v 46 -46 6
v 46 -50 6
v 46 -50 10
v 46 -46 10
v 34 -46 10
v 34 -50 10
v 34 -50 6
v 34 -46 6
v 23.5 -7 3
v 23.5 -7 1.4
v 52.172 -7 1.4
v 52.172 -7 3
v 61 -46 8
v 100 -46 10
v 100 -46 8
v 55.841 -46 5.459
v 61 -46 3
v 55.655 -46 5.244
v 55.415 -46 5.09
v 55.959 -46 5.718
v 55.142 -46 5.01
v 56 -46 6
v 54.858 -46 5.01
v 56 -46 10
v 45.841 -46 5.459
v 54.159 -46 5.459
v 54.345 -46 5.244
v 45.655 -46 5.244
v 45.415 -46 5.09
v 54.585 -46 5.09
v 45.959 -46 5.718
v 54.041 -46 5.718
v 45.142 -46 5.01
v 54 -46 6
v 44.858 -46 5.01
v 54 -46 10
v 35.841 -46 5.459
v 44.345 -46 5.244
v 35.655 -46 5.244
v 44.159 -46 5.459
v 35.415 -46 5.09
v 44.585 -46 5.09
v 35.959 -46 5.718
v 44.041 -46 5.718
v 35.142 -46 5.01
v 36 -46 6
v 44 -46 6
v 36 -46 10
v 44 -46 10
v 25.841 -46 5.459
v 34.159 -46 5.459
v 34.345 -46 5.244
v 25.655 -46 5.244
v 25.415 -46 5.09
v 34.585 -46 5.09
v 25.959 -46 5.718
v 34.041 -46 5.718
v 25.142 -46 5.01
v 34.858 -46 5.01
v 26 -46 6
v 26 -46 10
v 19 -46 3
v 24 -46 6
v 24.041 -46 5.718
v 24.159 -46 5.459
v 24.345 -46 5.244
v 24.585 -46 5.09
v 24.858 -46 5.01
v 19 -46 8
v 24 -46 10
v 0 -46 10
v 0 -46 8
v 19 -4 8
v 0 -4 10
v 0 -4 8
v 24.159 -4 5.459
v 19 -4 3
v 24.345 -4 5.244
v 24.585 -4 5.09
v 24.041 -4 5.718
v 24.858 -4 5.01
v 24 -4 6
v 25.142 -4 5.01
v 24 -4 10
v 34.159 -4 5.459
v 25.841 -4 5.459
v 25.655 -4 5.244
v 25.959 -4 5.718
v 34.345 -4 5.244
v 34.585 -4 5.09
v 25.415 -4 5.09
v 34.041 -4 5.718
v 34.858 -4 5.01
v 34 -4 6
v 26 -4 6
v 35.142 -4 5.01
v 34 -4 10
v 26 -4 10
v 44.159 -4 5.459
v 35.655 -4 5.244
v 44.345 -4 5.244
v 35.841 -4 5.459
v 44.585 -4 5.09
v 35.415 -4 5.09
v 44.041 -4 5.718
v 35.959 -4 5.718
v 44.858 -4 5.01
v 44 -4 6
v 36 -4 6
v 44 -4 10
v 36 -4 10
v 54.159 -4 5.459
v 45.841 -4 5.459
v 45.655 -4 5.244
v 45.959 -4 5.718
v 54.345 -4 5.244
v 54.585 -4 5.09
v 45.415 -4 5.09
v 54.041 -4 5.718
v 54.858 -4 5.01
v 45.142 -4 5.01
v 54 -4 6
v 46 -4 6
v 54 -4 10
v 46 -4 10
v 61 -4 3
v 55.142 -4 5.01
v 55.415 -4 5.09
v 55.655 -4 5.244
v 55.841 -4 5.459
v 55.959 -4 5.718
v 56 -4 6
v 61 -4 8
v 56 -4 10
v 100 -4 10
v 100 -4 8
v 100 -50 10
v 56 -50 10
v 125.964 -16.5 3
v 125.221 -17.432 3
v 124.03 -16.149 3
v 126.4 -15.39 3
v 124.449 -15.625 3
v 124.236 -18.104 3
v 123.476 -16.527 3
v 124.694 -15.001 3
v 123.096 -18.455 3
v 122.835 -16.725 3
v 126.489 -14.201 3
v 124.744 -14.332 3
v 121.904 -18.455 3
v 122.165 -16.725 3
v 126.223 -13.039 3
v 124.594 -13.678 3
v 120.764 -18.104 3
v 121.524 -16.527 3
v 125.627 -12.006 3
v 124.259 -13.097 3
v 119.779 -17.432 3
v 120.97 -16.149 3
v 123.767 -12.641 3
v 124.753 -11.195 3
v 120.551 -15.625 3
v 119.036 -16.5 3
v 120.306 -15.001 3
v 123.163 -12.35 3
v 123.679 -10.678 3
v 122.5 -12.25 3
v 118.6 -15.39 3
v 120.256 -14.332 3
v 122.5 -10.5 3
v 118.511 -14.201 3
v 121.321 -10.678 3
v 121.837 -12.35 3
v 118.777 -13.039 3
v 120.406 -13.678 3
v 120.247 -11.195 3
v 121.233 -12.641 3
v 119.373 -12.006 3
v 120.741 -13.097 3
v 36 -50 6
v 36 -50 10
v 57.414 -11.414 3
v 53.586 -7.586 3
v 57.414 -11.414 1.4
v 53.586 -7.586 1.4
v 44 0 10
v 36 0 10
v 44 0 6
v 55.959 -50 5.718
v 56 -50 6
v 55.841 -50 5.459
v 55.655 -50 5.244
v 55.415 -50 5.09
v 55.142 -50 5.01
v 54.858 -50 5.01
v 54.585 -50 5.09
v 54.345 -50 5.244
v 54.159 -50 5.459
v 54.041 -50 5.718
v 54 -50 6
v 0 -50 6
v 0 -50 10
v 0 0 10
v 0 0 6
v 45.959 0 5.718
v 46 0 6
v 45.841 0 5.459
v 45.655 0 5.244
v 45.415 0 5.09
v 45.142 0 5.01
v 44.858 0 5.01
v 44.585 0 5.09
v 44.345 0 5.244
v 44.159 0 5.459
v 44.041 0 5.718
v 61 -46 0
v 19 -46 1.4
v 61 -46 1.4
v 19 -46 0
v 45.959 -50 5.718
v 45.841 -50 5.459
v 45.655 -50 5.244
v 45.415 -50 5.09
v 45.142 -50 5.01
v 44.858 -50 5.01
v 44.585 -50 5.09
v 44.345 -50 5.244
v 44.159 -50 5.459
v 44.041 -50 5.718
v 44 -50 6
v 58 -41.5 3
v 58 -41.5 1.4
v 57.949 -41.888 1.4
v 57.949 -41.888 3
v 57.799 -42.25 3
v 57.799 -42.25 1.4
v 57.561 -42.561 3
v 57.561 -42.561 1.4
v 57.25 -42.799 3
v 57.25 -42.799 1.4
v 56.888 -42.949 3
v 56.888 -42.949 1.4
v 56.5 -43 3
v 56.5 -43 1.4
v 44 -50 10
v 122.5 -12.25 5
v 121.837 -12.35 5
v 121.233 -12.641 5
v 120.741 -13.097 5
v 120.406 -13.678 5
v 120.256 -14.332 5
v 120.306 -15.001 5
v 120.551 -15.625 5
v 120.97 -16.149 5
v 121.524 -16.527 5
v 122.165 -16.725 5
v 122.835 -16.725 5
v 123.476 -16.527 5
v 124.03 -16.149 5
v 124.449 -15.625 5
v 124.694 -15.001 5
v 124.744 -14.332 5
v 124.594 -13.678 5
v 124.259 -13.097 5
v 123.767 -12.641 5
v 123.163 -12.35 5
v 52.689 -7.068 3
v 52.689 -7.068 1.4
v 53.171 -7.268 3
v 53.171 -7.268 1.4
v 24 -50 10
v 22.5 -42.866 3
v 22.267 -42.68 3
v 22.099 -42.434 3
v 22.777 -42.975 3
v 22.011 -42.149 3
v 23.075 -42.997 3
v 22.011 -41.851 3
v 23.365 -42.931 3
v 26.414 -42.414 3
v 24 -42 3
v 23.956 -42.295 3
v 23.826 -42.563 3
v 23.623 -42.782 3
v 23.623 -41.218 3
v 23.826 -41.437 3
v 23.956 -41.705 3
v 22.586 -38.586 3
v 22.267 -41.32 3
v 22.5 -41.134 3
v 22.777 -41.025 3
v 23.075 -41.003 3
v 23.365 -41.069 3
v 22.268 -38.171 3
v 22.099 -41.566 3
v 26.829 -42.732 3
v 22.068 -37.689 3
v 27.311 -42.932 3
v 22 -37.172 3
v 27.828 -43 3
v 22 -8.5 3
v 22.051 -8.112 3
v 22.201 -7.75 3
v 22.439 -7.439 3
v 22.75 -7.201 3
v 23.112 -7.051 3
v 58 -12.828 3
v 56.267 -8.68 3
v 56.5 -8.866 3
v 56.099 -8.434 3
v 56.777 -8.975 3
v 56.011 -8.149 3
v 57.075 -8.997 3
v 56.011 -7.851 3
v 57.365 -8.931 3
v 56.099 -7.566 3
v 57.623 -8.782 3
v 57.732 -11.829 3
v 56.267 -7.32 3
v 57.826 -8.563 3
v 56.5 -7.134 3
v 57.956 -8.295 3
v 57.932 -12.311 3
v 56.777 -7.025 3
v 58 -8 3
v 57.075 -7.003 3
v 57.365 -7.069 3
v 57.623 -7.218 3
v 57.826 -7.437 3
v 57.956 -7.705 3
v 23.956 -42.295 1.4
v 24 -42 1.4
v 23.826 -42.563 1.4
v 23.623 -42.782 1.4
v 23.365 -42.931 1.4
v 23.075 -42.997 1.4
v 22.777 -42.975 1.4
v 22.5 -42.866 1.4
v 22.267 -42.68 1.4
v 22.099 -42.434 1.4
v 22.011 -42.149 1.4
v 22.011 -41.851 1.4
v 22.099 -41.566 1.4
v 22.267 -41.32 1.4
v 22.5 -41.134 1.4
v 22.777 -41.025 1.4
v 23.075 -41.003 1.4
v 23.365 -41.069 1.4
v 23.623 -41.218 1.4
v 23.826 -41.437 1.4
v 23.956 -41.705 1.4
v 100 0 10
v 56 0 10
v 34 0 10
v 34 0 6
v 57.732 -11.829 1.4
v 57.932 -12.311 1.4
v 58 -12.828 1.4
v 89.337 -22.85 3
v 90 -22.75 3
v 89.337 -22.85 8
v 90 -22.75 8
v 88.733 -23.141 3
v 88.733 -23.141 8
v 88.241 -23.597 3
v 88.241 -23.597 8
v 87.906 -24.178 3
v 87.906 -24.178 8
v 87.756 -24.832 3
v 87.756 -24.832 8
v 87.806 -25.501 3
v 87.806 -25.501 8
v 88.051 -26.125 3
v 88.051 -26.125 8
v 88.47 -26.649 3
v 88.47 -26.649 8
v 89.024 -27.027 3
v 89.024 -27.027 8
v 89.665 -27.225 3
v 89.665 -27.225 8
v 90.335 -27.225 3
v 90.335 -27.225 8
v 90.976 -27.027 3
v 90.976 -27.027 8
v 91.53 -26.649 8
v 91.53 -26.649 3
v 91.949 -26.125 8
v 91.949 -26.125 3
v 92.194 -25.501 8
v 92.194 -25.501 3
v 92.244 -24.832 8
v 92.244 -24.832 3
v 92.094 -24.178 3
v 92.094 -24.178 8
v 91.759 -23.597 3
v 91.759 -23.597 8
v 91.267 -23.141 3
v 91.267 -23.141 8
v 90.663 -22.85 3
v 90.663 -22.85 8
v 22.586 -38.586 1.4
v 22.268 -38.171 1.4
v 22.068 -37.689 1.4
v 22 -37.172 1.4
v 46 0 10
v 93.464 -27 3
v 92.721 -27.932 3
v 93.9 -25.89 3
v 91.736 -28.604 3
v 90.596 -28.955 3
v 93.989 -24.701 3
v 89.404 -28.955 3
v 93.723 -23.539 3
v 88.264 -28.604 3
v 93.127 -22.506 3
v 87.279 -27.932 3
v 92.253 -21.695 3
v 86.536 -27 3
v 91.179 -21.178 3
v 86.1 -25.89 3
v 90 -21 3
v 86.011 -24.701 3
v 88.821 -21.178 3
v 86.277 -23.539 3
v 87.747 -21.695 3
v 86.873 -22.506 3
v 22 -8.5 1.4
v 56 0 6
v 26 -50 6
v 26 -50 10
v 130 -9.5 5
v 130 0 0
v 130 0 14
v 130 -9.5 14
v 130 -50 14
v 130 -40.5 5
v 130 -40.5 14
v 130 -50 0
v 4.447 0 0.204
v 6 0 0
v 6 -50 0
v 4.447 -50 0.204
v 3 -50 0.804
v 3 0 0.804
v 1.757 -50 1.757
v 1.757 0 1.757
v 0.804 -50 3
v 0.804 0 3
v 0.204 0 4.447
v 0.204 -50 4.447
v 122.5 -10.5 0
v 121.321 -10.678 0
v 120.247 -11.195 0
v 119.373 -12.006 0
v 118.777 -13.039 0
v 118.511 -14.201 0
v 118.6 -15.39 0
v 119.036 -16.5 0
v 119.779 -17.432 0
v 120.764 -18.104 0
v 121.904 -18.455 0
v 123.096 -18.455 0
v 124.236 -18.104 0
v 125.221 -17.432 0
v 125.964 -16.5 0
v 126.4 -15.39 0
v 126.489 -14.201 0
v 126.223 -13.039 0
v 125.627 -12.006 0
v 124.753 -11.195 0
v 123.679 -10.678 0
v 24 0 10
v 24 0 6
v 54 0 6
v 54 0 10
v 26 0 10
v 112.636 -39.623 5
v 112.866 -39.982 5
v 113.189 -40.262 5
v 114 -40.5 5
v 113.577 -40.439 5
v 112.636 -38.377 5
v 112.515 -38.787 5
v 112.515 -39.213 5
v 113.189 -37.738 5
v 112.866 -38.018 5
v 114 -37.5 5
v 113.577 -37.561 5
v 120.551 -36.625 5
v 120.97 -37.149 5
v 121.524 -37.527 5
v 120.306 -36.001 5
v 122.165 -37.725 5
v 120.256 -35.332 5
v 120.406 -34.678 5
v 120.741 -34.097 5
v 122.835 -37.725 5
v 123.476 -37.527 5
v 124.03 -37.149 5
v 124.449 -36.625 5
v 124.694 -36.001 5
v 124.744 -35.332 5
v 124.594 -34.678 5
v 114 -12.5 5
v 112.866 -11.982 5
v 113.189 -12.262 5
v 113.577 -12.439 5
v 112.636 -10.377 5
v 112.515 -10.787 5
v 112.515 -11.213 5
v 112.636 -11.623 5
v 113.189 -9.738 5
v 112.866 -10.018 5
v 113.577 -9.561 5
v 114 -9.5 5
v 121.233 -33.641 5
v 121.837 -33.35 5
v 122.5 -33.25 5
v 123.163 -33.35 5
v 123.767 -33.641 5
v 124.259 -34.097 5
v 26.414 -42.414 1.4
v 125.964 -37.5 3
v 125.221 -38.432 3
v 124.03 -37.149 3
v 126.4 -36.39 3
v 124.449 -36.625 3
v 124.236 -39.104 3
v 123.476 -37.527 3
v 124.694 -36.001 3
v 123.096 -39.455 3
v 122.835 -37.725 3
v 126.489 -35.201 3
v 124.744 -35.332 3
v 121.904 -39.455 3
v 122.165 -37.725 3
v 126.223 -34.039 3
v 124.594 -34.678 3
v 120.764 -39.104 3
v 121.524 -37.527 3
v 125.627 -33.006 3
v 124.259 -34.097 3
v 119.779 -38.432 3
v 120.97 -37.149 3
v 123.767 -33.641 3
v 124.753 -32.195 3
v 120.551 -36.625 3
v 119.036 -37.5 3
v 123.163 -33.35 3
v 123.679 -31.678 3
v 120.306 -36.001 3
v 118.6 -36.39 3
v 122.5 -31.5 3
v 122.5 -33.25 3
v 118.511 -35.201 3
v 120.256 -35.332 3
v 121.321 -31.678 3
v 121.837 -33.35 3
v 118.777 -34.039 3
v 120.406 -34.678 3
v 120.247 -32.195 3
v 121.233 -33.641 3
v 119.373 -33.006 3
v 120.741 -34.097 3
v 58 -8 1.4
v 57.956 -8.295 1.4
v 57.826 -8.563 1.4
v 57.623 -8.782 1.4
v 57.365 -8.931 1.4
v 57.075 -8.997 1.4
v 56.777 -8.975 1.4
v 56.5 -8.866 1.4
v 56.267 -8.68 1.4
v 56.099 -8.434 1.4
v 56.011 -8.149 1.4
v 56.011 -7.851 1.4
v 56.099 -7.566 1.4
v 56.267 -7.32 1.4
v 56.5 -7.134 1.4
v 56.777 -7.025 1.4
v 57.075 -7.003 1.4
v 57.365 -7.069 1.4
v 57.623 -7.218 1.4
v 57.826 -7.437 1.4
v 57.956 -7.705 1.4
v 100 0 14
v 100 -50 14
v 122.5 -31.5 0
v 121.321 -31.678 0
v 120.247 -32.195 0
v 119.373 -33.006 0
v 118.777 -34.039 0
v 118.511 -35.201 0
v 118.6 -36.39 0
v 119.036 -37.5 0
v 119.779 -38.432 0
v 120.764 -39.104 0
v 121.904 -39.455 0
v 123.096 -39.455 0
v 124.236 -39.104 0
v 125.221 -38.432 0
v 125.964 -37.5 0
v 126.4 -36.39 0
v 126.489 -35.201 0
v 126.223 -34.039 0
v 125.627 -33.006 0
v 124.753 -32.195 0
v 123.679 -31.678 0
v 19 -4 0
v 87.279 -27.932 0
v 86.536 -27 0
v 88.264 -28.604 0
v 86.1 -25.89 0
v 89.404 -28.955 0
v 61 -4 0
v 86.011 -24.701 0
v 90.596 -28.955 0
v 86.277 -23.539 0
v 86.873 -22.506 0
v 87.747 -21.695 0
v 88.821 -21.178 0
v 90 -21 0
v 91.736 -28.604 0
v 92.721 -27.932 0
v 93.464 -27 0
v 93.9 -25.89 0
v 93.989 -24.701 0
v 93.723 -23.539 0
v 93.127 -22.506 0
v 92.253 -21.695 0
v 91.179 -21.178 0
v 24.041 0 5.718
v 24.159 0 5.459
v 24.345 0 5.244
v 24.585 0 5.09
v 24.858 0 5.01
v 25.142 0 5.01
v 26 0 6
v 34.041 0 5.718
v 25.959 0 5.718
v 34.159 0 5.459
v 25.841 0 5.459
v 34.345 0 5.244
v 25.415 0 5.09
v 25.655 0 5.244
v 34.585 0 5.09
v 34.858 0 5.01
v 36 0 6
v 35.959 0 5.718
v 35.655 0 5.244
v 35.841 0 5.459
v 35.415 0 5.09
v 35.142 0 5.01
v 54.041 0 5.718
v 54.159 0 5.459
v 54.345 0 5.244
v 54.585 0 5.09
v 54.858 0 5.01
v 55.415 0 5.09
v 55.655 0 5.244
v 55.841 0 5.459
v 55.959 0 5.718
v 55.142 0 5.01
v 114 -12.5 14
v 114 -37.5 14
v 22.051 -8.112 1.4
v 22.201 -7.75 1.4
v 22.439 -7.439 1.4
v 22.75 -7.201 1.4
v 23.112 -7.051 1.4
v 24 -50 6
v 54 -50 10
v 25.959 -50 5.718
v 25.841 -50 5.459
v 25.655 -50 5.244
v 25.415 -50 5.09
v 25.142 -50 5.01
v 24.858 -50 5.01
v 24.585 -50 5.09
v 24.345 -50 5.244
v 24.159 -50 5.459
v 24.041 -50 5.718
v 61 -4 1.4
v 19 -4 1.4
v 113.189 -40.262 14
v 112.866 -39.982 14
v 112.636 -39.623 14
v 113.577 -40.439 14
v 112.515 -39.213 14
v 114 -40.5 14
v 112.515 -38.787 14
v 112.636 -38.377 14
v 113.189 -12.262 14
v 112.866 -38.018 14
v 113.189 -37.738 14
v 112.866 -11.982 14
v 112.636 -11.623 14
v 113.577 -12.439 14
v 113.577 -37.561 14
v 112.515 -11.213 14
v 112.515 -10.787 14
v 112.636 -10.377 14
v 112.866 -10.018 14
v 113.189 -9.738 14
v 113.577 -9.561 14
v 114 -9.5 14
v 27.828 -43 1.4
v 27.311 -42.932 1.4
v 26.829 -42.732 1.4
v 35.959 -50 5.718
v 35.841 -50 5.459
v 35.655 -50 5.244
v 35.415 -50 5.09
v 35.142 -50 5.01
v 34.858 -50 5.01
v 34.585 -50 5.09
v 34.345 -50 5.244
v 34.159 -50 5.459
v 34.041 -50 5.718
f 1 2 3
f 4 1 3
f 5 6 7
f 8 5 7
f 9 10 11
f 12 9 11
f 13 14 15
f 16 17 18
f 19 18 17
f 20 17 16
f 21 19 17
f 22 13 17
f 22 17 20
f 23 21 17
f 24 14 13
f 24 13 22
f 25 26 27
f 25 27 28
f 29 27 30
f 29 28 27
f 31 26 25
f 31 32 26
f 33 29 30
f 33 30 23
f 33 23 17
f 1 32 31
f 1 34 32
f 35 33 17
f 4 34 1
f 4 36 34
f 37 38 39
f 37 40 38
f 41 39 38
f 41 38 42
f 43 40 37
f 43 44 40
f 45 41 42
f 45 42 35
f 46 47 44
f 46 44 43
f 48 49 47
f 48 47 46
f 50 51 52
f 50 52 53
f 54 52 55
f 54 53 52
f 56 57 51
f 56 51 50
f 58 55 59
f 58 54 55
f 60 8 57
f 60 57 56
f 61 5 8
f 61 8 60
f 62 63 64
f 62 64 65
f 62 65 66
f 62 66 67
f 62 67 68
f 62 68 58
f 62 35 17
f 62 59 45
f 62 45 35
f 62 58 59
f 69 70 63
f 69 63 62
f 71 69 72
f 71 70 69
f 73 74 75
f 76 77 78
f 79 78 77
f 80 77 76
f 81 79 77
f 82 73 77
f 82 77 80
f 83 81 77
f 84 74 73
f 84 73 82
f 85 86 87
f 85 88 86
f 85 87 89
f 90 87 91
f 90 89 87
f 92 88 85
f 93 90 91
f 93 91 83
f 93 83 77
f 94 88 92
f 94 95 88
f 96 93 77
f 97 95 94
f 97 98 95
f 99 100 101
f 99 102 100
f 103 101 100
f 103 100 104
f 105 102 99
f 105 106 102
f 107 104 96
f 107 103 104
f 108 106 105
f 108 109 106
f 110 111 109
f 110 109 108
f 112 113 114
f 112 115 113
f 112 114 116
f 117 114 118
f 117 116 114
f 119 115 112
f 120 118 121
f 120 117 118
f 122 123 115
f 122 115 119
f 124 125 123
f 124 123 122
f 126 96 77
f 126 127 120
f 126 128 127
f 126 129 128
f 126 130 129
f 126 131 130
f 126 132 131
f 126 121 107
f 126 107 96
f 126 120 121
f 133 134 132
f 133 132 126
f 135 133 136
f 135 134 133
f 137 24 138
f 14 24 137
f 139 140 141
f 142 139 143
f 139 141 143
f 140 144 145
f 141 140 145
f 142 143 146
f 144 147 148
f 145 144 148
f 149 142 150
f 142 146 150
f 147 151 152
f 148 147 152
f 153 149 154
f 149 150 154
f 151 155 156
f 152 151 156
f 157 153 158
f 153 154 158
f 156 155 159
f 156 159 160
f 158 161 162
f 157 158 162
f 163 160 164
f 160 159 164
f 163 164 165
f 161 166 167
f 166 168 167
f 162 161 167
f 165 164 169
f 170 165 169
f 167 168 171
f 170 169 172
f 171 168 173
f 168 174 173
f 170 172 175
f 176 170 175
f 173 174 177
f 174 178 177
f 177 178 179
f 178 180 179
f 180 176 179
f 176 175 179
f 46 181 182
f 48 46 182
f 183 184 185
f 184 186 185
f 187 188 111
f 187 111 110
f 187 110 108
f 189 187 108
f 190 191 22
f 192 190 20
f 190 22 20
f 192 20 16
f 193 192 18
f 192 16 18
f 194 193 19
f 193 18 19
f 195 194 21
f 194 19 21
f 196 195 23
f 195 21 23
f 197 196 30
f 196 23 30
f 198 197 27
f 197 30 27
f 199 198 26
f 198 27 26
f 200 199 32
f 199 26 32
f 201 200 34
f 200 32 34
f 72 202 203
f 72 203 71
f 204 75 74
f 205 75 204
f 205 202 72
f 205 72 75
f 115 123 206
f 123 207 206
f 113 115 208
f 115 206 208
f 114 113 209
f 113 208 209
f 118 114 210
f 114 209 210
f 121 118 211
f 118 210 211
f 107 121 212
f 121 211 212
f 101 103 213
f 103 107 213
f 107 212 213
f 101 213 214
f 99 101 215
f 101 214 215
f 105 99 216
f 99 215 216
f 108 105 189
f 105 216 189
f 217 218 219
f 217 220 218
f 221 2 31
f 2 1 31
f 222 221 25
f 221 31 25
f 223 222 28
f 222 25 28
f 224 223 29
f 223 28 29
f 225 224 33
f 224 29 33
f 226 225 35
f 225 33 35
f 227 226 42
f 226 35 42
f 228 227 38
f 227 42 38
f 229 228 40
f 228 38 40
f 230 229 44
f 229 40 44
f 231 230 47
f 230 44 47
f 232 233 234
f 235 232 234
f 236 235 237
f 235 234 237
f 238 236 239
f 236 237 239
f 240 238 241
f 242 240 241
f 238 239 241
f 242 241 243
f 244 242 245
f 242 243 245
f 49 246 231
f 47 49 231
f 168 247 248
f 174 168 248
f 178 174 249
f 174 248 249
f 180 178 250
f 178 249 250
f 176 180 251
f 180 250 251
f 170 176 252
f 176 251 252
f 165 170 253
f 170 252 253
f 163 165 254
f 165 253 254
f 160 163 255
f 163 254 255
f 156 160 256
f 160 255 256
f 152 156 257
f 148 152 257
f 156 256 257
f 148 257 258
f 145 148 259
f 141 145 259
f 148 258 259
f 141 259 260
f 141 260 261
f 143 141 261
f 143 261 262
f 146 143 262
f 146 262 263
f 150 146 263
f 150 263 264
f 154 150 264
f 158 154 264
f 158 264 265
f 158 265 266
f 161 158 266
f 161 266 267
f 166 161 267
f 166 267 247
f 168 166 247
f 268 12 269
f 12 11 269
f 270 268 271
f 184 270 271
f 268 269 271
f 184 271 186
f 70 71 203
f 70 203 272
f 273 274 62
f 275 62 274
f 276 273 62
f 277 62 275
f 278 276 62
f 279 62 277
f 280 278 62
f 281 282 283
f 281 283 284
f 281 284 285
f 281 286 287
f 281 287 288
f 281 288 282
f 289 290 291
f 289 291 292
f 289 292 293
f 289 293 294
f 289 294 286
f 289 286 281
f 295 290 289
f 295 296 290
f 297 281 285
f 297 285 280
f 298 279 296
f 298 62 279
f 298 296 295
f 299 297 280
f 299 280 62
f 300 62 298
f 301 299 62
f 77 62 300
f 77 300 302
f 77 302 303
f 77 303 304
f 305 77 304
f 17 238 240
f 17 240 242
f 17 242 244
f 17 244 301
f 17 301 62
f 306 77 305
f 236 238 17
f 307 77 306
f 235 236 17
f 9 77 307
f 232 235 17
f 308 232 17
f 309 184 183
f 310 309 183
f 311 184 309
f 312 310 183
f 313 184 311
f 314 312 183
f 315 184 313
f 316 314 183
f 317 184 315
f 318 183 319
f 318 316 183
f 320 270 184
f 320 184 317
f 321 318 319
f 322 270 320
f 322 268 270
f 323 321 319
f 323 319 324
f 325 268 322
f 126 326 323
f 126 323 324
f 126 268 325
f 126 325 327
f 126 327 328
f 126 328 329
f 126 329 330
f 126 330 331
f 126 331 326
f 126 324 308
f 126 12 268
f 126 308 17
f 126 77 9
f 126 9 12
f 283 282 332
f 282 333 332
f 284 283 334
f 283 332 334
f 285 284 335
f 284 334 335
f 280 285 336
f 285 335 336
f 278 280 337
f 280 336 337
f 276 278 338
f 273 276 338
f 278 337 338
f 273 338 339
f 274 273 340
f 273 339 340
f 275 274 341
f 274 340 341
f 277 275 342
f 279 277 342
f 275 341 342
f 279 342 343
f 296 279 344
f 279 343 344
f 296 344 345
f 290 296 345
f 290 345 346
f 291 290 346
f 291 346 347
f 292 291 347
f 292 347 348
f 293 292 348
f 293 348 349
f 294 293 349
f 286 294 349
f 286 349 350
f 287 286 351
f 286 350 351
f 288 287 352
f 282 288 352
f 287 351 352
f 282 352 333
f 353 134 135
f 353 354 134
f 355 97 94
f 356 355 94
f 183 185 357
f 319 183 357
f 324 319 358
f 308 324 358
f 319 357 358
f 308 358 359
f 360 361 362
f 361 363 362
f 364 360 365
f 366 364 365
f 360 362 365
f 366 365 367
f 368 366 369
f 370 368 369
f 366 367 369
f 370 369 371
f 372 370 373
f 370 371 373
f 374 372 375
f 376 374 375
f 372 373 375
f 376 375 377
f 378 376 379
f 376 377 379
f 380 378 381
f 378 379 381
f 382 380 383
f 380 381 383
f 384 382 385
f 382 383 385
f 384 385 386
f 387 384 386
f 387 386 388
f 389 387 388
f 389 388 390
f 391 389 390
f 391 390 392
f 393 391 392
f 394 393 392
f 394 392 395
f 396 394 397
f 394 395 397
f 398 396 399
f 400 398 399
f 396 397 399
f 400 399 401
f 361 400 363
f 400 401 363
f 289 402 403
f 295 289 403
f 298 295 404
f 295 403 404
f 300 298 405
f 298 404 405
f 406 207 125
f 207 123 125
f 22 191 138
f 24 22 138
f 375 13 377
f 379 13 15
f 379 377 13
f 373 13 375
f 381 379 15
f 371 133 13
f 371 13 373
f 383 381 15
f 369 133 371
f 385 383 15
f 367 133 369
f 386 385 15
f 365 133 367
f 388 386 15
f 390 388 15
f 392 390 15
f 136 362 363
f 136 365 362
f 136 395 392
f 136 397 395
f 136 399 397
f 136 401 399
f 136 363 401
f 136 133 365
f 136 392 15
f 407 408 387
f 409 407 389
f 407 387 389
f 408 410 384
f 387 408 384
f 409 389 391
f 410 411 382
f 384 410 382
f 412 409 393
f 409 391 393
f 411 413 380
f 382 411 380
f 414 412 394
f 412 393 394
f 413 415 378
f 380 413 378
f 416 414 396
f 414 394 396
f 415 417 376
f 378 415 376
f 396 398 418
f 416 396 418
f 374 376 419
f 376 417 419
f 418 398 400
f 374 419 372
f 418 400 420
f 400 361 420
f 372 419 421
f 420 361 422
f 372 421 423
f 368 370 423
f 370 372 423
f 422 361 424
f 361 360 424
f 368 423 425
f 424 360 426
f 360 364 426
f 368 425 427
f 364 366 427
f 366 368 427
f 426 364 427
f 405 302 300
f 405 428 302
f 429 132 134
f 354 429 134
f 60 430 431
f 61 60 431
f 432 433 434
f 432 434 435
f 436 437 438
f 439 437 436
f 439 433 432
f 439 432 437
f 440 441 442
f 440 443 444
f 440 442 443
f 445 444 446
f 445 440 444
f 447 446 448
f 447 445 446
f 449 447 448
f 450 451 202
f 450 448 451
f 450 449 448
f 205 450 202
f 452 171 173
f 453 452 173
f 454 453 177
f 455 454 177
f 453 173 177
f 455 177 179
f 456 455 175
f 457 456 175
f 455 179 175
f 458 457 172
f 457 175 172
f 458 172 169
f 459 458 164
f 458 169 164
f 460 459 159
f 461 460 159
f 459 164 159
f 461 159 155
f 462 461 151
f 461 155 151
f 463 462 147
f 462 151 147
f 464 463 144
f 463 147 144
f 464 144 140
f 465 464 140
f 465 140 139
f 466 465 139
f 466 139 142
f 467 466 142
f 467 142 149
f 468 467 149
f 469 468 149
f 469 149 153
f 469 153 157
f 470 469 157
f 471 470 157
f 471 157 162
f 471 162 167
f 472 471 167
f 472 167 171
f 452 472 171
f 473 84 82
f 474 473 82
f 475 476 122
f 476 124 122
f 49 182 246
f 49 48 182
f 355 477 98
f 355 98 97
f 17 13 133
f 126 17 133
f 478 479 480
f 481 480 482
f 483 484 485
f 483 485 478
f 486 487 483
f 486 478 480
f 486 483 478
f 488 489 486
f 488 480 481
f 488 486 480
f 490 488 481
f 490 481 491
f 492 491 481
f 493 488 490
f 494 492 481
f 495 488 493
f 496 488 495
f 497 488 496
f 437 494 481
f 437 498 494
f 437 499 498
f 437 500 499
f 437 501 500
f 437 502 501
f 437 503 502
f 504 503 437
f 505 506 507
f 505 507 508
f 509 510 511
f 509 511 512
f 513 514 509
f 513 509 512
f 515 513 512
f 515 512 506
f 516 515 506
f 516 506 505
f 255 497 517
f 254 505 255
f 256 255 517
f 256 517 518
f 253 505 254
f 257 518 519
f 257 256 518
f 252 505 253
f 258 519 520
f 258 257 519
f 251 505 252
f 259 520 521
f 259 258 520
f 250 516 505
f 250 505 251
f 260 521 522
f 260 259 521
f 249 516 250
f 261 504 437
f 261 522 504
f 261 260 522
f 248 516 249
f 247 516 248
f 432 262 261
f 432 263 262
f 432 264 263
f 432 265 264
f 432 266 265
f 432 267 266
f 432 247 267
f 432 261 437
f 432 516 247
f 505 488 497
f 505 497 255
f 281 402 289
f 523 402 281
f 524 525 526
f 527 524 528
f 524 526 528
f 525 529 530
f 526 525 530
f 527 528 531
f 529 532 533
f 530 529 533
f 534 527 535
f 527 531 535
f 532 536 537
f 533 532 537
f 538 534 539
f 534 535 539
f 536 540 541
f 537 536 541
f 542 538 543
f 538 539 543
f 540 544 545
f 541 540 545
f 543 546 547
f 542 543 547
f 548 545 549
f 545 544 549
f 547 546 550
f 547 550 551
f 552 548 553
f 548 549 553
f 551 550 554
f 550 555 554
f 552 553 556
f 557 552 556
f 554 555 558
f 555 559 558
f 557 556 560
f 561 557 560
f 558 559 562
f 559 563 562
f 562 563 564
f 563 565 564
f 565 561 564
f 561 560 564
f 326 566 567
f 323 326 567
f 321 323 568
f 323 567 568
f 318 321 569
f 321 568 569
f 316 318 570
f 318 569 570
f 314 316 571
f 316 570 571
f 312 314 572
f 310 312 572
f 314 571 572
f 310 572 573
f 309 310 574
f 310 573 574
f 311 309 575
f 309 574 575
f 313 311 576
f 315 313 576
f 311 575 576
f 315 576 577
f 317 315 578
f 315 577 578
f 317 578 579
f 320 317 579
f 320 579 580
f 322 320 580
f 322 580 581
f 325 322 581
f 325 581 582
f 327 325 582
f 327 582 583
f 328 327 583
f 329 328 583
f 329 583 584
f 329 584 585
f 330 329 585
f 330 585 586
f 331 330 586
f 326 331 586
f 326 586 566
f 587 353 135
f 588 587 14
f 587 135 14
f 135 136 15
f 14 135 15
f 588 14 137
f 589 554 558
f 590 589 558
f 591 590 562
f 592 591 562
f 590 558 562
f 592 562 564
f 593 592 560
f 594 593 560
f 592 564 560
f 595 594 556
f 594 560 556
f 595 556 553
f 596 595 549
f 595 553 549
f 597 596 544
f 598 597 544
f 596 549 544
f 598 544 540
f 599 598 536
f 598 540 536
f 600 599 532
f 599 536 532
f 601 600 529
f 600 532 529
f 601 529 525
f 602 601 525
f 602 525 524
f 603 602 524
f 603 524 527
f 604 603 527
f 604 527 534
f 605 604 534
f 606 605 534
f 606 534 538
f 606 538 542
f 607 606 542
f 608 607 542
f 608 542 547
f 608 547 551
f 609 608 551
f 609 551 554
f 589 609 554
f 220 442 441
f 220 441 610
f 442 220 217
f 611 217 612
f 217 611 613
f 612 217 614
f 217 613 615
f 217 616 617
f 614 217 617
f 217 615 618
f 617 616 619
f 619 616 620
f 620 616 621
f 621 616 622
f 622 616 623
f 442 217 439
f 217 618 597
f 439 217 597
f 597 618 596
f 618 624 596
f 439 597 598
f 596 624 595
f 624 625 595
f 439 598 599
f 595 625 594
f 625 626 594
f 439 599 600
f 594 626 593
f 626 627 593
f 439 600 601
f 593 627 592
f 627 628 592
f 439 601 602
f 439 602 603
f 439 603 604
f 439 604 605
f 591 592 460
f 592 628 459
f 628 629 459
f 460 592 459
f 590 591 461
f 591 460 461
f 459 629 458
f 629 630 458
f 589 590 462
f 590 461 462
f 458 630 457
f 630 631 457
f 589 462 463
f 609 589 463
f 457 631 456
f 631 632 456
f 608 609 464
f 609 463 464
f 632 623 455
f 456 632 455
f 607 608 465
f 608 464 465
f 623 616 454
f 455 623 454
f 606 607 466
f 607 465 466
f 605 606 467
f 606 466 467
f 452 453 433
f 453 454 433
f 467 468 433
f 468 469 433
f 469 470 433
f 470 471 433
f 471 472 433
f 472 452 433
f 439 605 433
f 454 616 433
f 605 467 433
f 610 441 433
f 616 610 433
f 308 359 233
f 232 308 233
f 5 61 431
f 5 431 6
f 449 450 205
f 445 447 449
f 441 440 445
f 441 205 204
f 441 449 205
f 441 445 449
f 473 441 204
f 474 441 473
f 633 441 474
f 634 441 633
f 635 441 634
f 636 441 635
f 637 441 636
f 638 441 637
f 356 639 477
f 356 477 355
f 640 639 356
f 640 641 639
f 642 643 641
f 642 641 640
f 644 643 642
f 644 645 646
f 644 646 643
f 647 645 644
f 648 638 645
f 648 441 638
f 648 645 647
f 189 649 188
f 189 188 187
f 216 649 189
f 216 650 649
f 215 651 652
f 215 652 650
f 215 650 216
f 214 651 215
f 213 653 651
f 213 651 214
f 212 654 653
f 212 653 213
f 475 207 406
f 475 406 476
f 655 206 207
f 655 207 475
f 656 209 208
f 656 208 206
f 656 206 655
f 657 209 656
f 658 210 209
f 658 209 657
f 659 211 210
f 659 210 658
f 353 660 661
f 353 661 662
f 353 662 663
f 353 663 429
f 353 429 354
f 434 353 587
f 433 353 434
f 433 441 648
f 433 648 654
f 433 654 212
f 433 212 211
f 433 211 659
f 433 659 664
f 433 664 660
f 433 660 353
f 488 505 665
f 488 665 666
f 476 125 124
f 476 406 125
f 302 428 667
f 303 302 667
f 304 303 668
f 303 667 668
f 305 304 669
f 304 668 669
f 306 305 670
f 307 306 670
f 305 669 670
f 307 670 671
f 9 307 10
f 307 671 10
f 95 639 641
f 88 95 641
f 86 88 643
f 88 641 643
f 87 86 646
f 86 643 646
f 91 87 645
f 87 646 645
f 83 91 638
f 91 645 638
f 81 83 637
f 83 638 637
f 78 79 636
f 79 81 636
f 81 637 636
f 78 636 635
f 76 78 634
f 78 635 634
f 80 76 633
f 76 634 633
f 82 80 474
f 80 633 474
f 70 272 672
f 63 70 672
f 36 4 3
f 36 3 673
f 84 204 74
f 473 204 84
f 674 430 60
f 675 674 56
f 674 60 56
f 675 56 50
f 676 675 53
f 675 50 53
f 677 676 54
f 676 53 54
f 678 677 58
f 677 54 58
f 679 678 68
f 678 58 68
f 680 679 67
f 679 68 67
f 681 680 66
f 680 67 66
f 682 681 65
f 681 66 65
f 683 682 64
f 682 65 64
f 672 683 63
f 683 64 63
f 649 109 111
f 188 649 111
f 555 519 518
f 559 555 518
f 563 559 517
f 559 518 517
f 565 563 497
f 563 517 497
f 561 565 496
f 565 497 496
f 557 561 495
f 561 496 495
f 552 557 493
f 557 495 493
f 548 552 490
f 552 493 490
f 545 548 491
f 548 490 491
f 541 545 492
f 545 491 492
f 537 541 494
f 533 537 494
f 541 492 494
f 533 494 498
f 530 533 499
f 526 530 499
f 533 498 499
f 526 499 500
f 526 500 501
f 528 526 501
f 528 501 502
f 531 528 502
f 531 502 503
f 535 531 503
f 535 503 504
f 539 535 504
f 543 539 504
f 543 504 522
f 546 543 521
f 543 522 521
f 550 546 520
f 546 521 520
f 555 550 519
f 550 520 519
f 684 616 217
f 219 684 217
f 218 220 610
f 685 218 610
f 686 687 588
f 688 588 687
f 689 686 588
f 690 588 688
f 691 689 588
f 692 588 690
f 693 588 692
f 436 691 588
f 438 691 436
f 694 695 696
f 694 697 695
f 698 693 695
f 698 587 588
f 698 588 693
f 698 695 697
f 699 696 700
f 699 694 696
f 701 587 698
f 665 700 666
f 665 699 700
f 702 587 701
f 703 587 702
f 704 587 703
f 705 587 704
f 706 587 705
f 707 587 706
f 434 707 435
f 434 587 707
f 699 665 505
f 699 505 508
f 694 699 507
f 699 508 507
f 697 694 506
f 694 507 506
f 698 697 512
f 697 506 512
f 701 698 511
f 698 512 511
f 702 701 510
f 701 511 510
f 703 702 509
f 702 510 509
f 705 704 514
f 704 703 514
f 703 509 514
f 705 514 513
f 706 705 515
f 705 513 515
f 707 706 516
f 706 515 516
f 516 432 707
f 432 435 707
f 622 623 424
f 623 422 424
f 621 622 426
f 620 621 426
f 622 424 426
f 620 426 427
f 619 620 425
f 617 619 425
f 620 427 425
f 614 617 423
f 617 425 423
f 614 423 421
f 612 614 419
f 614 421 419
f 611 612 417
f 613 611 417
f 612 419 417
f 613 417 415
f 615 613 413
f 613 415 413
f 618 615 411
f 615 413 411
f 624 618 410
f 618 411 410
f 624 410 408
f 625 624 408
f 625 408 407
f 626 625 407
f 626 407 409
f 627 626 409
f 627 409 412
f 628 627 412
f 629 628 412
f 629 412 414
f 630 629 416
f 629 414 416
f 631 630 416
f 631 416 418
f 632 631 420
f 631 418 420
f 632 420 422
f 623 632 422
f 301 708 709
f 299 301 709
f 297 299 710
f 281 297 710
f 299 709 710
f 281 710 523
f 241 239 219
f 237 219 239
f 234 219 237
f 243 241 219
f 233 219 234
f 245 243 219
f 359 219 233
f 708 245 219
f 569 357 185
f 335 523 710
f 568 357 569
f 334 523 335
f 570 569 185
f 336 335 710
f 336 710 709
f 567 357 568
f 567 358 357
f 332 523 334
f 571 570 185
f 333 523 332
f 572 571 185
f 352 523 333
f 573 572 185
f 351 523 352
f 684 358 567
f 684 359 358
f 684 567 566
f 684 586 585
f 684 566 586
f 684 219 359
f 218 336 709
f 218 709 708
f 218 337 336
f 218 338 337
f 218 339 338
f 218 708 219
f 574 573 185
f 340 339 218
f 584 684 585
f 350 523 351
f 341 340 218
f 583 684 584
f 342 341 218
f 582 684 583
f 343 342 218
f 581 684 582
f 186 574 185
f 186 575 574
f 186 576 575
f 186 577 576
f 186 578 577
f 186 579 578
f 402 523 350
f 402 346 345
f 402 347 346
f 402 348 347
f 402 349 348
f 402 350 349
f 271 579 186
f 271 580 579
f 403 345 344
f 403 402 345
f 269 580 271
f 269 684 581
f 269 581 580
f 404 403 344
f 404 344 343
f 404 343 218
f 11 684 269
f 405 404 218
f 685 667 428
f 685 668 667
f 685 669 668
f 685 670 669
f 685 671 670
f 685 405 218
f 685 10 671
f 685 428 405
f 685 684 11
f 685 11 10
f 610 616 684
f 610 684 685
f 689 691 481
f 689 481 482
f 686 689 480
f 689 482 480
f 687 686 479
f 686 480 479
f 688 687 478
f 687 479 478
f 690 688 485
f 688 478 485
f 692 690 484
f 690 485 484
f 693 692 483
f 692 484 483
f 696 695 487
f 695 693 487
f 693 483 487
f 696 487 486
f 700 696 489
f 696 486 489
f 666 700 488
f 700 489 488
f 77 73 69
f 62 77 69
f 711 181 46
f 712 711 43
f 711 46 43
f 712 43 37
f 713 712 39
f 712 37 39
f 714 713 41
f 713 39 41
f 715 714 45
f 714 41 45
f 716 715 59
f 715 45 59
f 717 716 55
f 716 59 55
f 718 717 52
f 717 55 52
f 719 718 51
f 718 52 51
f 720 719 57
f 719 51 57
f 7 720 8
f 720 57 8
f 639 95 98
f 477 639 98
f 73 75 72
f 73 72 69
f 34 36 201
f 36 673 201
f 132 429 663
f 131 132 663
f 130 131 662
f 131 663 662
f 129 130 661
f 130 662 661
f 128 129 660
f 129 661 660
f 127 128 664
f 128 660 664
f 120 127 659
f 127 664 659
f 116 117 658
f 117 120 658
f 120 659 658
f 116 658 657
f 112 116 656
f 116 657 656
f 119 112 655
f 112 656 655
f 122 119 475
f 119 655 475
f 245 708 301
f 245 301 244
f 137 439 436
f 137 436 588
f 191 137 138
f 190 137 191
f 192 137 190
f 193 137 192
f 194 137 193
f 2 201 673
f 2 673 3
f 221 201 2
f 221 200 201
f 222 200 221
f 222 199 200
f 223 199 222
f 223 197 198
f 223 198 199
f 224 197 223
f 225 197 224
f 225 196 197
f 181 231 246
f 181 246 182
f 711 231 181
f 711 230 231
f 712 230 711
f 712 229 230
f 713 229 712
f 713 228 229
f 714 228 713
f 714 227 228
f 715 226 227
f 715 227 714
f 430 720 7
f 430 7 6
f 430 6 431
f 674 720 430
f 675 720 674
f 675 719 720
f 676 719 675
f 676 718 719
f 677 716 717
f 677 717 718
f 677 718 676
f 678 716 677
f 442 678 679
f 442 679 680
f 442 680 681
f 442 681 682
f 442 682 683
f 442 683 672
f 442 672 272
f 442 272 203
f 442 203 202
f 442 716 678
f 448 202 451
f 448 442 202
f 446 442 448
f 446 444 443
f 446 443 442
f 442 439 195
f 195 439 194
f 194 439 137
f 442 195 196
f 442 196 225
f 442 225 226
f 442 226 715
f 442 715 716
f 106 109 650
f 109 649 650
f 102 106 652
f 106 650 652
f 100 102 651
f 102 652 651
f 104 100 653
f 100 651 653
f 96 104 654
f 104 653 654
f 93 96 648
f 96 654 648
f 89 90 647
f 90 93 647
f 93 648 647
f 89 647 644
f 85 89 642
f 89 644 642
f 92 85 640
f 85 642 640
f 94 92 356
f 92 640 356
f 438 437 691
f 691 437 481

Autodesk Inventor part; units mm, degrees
ref_plane "YZ Plane" through (0, 0, 0) normal (1, 0, 0) x (0, 1, 0)
ref_plane "XZ Plane" through (0, 0, 0) normal (0, 1, 0) x (-1, 0, 0)
ref_plane "XY Plane" through (0, 0, 0) normal (0, 0, 1) x (1, 0, 0)
sketch "unten" plane through (0, 0, 0) normal (0, 0, 1) x (1, 0, 0)
  line L0 (0, 0) -> (130, 0)
  line L1 (130, 0) -> (130, -50)
  line L2 (130, -50) -> (0, -50)
  line L3 (0, -50) -> (0, 0)
  line L4 (23.5, -7) -> (52.1715, -7)
  line L5 (58, -12.8285) -> (58, -41.5)
  line L6 (27.8285, -43) -> (56.5, -43)
  line L7 (22, -8.5) -> (22, -37.1715)
  arc A0 (23.5, -7) -> (22, -8.5) centre (23.5, -8.5) ccw
  circle A1 centre (23, -42) radius 1
  circle A2 centre (57, -8) radius 1
  arc A3 (56.5, -43) -> (58, -41.5) centre (56.5, -41.5) ccw
  line L8 (61.9906, -8.5458) -> (71.0184, -8.5458) construction
  line L9 (53.5857, -7.5858) -> (57.4142, -11.4143)
  line L10 (57.2091, -11.2092) -> (62.6234, -11.2092) construction
  arc A4 (58, -12.8285) -> (57.4142, -11.4143) centre (56, -12.8285) ccw
  arc A5 (53.5857, -7.5858) -> (52.1715, -7) centre (52.1715, -9) ccw
  line L11 (22.5858, -38.5857) -> (26.4143, -42.4142)
  line L12 (26.3083, -42.3082) -> (31.7226, -42.3082) construction
  arc A6 (22, -37.1715) -> (22.5858, -38.5857) centre (24, -37.1715) ccw
  arc A7 (26.4143, -42.4142) -> (27.8285, -43) centre (27.8285, -41) ccw
  line L13 (130, -9.5) -> (130, -40.5)
  line L14 (130, -50) -> (130, 0)
  line L15 (130, 0) -> (130, -50)
  point P0 (33.5, -8.5)
  dimension "d0" = 130
  dimension "d1" = 50
  dimension "d15" = 1.5
  dimension "d18" = 2
  dimension "d21" = 2
  dimension "d24" = 1.5
  dimension "d29" = 45
  dimension "d31" = 2
  dimension "d32" = 45
  dimension "d34" = 2
  dimension "d51" = 7
  dimension "d52" = 7
  dimension "d53" = 36
  dimension "d55" = 8
  dimension "d56" = 1
  dimension "d57" = 1
  dimension "d58" = 1
  dimension "d59" = 2.1214
  dimension "d60" = 22
  dimension "d61" = 1.5
  dimension "d62" = 1.5
  dimension "d63" = 2.1214
  dimension "d64" = 1.5
  dimension "d65" = 1.5
extrude "Extrusion1" add sketch "unten" along normal blind 10
sketch "Sketch2" plane through (0, 0, 10) normal (0, 0, 1) x (1, 0, 0)
  line L0 (114, -9.5) -> (130, -9.5)
  line L1 (130, -50) -> (130, 0) projected
  line L2 (130, 0) -> (0, 0) projected
  line L3 (130, -9.5) -> (130, 0)
  line L4 (130, 0) -> (0, 0) projected
  line L5 (130, 0) -> (100, 0)
  line L6 (100, 0) -> (100, -50)
  line L7 (0, -50) -> (130, -50) projected
  line L8 (130, -50) -> (130, -40.5)
  line L9 (130, -40.5) -> (114, -40.5)
  line L10 (114, -12.5) -> (114, -37.5)
  arc A0 (114, -9.5) -> (114, -12.5) centre (114, -11) ccw
  arc A1 (114, -37.5) -> (114, -40.5) centre (114, -39) ccw
  dimension "d69" = 16
  dimension "d70" = 9.5
  dimension "d71" = 30
  dimension "d72" = 9.5
  dimension "d73" = 16
  dimension "d74" = 16
  dimension "d75" = 16
  dimension "d77" = 1.5
  dimension "d78" = 3
  dimension "d80" = 1.5
extrude "Extrusion2" add sketch "Sketch2" along normal blind 4 contours A0 L10 A1 L9 L1 L7 L6 L2 L0
sketch "Sketch3" plane through (0, 0, 10) normal (0, 0, 1) x (1, 0, 0)
  line L0 (100, -50) -> (100, 0) projected
  line L1 (0, -4) -> (100, -4)
  line L2 (100, -4) -> (100, -46)
  line L3 (100, -46) -> (0, -46)
  line L4 (0, -46) -> (0, -4)
  line L5 (100, 0) -> (0, 0) projected
  line L6 (0, -50) -> (100, -50) projected
  dimension "d83" = 4
  dimension "d84" = 4
extrude "Extrusion3" cut sketch "Sketch3" against normal blind 2
sketch "Sketch4" plane through (0, 0, 8) normal (0, 0, 1) x (1, 0, 0)
  line L0 (61, -4) -> (19, -4)
  line L1 (19, -4) -> (19, -46)
  line L2 (19, -46) -> (61, -46)
  line L3 (61, -46) -> (61, -4)
  line L4 (22, -8.5) -> (22, -37.1715) projected
  line L5 (27.8285, -43) -> (56.5, -43) projected
  point P0 (0, 0)
  dimension "d87" = 42
  dimension "d88" = 42
  dimension "d89" = 3
  dimension "d90" = 3
extrude "Extrusion4" cut sketch "Sketch4" against normal blind 5
sketch "Sketch5" plane through (0, 0, 0) normal (0, 0, -1) x (-1, 0, 0)
  line L0 (-19, -46) -> (-19, -4) projected
  line L1 (-61, -4) -> (-61, -46) projected
  line L2 (-19, -46) -> (-61, -46)
  line L3 (-61, -46) -> (-61, -4)
  line L4 (-61, -4) -> (-19, -4)
  line L5 (-19, -4) -> (-19, -46)
  point P0 (0, 0)
extrude "Extrusion5" cut sketch "Sketch5" against normal blind 1.4
fillet "Fillet1" radius 6 1 edges at (0, -25, 0)
sketch "Sketch6" plane through (0, 0, 0) normal (0, 0, -1) x (-1, 0, 0)
  line L0 (-6, -50) -> (-130, -50) projected
  line L1 (-130, 0) -> (-6, 0) projected
  line L2 (-130, -50) -> (-130, 0) projected
  point P0 (0, 0)
  point P1 (-122.5, -35.5)
  point P2 (-122.5, -14.5)
  dimension "d96" = 14.5
  dimension "d97" = 14.5
  dimension "d98" = 7.5
  dimension "d99" = 7.5
hole "Hole1" at (122.5, -35.5, 0) at (122.5, -14.5, 0) direction (0, 0, 1) diameter 4.5 end through all counterbore diameter 8 counterbore depth 3
sketch "Sketch7" plane through (0, 0, 0) normal (0, 0, -1) x (-1, 0, 0)
  line L0 (-130, 0) -> (-6, 0) projected
  line L1 (-100, -4) -> (-100, -46) projected
  point P0 (0, 0)
  point P1 (-90, -25)
  dimension "d119" = 25
  dimension "d120" = 10
hole "Hole2" at (90, -25, 0) direction (0, 0, 1) diameter 4.5 end through all counterbore diameter 8 counterbore depth 3
hole "Hole4" at (25, -50, 6) direction (0, 1, 0) diameter 2 end through all
pattern_linear "Rectangular Pattern1" count 4 spacing 10 along (1, 0, 0) of "Hole4"
sketch "Sketch10" plane through (0, 0, 10) normal (0, 0, 1) x (1, 0, 0)
  line L0 (130, -9.5) -> (114, -9.5) projected
  line L1 (130, -9.5) -> (114, -9.5)
  arc A0 (114, -9.5) -> (114, -12.5) centre (114, -11) ccw projected
  arc A1 (114, -12.5) -> (114, -12.5) centre (114, -11) ccw
  arc A2 (114, -37.5) -> (114, -40.5) centre (114, -39) ccw projected
  line L2 (114, -12.5) -> (114, -37.5)
  arc A3 (114, -37.5) -> (114, -40.5) centre (114, -39) ccw
  line L3 (114, -40.5) -> (130, -40.5) projected
  line L4 (114, -40.5) -> (130, -40.5)
  line L5 (130, -50) -> (130, 0) projected
  line L6 (130, -40.5) -> (130, -9.5) projected
  line L7 (130, -9.5) -> (130, -40.5)
  point P0 (0, 0)
extrude "Extrusion6" cut sketch "Sketch10" against normal blind 5
sketch "Sketch11" plane through (0, -50, 10) normal (0, -1, 0) x (1, 0, 0)
  circle A0 centre (25, -4) radius 1 projected
  line L0 (100, 0) -> (0, 0) projected
  line L1 (24, -4) -> (26, -4)
  line L2 (26, -4) -> (26, 0)
  line L3 (26, 0) -> (24, 0)
  line L4 (24, 0) -> (24, -4)
  point P0 (0, -10)
extrude "Extrusion7" cut sketch "Sketch11" against normal through all contours L1 A0 | A0 L4 L0 L2 picked at (25.0402, -3.6691)
pattern_linear "Rectangular Pattern2" count 4 spacing 10 along (1, 0, 0) of "Extrusion7"
properties part number "TNS_Greiferbacke_MA_Jun_T1"
